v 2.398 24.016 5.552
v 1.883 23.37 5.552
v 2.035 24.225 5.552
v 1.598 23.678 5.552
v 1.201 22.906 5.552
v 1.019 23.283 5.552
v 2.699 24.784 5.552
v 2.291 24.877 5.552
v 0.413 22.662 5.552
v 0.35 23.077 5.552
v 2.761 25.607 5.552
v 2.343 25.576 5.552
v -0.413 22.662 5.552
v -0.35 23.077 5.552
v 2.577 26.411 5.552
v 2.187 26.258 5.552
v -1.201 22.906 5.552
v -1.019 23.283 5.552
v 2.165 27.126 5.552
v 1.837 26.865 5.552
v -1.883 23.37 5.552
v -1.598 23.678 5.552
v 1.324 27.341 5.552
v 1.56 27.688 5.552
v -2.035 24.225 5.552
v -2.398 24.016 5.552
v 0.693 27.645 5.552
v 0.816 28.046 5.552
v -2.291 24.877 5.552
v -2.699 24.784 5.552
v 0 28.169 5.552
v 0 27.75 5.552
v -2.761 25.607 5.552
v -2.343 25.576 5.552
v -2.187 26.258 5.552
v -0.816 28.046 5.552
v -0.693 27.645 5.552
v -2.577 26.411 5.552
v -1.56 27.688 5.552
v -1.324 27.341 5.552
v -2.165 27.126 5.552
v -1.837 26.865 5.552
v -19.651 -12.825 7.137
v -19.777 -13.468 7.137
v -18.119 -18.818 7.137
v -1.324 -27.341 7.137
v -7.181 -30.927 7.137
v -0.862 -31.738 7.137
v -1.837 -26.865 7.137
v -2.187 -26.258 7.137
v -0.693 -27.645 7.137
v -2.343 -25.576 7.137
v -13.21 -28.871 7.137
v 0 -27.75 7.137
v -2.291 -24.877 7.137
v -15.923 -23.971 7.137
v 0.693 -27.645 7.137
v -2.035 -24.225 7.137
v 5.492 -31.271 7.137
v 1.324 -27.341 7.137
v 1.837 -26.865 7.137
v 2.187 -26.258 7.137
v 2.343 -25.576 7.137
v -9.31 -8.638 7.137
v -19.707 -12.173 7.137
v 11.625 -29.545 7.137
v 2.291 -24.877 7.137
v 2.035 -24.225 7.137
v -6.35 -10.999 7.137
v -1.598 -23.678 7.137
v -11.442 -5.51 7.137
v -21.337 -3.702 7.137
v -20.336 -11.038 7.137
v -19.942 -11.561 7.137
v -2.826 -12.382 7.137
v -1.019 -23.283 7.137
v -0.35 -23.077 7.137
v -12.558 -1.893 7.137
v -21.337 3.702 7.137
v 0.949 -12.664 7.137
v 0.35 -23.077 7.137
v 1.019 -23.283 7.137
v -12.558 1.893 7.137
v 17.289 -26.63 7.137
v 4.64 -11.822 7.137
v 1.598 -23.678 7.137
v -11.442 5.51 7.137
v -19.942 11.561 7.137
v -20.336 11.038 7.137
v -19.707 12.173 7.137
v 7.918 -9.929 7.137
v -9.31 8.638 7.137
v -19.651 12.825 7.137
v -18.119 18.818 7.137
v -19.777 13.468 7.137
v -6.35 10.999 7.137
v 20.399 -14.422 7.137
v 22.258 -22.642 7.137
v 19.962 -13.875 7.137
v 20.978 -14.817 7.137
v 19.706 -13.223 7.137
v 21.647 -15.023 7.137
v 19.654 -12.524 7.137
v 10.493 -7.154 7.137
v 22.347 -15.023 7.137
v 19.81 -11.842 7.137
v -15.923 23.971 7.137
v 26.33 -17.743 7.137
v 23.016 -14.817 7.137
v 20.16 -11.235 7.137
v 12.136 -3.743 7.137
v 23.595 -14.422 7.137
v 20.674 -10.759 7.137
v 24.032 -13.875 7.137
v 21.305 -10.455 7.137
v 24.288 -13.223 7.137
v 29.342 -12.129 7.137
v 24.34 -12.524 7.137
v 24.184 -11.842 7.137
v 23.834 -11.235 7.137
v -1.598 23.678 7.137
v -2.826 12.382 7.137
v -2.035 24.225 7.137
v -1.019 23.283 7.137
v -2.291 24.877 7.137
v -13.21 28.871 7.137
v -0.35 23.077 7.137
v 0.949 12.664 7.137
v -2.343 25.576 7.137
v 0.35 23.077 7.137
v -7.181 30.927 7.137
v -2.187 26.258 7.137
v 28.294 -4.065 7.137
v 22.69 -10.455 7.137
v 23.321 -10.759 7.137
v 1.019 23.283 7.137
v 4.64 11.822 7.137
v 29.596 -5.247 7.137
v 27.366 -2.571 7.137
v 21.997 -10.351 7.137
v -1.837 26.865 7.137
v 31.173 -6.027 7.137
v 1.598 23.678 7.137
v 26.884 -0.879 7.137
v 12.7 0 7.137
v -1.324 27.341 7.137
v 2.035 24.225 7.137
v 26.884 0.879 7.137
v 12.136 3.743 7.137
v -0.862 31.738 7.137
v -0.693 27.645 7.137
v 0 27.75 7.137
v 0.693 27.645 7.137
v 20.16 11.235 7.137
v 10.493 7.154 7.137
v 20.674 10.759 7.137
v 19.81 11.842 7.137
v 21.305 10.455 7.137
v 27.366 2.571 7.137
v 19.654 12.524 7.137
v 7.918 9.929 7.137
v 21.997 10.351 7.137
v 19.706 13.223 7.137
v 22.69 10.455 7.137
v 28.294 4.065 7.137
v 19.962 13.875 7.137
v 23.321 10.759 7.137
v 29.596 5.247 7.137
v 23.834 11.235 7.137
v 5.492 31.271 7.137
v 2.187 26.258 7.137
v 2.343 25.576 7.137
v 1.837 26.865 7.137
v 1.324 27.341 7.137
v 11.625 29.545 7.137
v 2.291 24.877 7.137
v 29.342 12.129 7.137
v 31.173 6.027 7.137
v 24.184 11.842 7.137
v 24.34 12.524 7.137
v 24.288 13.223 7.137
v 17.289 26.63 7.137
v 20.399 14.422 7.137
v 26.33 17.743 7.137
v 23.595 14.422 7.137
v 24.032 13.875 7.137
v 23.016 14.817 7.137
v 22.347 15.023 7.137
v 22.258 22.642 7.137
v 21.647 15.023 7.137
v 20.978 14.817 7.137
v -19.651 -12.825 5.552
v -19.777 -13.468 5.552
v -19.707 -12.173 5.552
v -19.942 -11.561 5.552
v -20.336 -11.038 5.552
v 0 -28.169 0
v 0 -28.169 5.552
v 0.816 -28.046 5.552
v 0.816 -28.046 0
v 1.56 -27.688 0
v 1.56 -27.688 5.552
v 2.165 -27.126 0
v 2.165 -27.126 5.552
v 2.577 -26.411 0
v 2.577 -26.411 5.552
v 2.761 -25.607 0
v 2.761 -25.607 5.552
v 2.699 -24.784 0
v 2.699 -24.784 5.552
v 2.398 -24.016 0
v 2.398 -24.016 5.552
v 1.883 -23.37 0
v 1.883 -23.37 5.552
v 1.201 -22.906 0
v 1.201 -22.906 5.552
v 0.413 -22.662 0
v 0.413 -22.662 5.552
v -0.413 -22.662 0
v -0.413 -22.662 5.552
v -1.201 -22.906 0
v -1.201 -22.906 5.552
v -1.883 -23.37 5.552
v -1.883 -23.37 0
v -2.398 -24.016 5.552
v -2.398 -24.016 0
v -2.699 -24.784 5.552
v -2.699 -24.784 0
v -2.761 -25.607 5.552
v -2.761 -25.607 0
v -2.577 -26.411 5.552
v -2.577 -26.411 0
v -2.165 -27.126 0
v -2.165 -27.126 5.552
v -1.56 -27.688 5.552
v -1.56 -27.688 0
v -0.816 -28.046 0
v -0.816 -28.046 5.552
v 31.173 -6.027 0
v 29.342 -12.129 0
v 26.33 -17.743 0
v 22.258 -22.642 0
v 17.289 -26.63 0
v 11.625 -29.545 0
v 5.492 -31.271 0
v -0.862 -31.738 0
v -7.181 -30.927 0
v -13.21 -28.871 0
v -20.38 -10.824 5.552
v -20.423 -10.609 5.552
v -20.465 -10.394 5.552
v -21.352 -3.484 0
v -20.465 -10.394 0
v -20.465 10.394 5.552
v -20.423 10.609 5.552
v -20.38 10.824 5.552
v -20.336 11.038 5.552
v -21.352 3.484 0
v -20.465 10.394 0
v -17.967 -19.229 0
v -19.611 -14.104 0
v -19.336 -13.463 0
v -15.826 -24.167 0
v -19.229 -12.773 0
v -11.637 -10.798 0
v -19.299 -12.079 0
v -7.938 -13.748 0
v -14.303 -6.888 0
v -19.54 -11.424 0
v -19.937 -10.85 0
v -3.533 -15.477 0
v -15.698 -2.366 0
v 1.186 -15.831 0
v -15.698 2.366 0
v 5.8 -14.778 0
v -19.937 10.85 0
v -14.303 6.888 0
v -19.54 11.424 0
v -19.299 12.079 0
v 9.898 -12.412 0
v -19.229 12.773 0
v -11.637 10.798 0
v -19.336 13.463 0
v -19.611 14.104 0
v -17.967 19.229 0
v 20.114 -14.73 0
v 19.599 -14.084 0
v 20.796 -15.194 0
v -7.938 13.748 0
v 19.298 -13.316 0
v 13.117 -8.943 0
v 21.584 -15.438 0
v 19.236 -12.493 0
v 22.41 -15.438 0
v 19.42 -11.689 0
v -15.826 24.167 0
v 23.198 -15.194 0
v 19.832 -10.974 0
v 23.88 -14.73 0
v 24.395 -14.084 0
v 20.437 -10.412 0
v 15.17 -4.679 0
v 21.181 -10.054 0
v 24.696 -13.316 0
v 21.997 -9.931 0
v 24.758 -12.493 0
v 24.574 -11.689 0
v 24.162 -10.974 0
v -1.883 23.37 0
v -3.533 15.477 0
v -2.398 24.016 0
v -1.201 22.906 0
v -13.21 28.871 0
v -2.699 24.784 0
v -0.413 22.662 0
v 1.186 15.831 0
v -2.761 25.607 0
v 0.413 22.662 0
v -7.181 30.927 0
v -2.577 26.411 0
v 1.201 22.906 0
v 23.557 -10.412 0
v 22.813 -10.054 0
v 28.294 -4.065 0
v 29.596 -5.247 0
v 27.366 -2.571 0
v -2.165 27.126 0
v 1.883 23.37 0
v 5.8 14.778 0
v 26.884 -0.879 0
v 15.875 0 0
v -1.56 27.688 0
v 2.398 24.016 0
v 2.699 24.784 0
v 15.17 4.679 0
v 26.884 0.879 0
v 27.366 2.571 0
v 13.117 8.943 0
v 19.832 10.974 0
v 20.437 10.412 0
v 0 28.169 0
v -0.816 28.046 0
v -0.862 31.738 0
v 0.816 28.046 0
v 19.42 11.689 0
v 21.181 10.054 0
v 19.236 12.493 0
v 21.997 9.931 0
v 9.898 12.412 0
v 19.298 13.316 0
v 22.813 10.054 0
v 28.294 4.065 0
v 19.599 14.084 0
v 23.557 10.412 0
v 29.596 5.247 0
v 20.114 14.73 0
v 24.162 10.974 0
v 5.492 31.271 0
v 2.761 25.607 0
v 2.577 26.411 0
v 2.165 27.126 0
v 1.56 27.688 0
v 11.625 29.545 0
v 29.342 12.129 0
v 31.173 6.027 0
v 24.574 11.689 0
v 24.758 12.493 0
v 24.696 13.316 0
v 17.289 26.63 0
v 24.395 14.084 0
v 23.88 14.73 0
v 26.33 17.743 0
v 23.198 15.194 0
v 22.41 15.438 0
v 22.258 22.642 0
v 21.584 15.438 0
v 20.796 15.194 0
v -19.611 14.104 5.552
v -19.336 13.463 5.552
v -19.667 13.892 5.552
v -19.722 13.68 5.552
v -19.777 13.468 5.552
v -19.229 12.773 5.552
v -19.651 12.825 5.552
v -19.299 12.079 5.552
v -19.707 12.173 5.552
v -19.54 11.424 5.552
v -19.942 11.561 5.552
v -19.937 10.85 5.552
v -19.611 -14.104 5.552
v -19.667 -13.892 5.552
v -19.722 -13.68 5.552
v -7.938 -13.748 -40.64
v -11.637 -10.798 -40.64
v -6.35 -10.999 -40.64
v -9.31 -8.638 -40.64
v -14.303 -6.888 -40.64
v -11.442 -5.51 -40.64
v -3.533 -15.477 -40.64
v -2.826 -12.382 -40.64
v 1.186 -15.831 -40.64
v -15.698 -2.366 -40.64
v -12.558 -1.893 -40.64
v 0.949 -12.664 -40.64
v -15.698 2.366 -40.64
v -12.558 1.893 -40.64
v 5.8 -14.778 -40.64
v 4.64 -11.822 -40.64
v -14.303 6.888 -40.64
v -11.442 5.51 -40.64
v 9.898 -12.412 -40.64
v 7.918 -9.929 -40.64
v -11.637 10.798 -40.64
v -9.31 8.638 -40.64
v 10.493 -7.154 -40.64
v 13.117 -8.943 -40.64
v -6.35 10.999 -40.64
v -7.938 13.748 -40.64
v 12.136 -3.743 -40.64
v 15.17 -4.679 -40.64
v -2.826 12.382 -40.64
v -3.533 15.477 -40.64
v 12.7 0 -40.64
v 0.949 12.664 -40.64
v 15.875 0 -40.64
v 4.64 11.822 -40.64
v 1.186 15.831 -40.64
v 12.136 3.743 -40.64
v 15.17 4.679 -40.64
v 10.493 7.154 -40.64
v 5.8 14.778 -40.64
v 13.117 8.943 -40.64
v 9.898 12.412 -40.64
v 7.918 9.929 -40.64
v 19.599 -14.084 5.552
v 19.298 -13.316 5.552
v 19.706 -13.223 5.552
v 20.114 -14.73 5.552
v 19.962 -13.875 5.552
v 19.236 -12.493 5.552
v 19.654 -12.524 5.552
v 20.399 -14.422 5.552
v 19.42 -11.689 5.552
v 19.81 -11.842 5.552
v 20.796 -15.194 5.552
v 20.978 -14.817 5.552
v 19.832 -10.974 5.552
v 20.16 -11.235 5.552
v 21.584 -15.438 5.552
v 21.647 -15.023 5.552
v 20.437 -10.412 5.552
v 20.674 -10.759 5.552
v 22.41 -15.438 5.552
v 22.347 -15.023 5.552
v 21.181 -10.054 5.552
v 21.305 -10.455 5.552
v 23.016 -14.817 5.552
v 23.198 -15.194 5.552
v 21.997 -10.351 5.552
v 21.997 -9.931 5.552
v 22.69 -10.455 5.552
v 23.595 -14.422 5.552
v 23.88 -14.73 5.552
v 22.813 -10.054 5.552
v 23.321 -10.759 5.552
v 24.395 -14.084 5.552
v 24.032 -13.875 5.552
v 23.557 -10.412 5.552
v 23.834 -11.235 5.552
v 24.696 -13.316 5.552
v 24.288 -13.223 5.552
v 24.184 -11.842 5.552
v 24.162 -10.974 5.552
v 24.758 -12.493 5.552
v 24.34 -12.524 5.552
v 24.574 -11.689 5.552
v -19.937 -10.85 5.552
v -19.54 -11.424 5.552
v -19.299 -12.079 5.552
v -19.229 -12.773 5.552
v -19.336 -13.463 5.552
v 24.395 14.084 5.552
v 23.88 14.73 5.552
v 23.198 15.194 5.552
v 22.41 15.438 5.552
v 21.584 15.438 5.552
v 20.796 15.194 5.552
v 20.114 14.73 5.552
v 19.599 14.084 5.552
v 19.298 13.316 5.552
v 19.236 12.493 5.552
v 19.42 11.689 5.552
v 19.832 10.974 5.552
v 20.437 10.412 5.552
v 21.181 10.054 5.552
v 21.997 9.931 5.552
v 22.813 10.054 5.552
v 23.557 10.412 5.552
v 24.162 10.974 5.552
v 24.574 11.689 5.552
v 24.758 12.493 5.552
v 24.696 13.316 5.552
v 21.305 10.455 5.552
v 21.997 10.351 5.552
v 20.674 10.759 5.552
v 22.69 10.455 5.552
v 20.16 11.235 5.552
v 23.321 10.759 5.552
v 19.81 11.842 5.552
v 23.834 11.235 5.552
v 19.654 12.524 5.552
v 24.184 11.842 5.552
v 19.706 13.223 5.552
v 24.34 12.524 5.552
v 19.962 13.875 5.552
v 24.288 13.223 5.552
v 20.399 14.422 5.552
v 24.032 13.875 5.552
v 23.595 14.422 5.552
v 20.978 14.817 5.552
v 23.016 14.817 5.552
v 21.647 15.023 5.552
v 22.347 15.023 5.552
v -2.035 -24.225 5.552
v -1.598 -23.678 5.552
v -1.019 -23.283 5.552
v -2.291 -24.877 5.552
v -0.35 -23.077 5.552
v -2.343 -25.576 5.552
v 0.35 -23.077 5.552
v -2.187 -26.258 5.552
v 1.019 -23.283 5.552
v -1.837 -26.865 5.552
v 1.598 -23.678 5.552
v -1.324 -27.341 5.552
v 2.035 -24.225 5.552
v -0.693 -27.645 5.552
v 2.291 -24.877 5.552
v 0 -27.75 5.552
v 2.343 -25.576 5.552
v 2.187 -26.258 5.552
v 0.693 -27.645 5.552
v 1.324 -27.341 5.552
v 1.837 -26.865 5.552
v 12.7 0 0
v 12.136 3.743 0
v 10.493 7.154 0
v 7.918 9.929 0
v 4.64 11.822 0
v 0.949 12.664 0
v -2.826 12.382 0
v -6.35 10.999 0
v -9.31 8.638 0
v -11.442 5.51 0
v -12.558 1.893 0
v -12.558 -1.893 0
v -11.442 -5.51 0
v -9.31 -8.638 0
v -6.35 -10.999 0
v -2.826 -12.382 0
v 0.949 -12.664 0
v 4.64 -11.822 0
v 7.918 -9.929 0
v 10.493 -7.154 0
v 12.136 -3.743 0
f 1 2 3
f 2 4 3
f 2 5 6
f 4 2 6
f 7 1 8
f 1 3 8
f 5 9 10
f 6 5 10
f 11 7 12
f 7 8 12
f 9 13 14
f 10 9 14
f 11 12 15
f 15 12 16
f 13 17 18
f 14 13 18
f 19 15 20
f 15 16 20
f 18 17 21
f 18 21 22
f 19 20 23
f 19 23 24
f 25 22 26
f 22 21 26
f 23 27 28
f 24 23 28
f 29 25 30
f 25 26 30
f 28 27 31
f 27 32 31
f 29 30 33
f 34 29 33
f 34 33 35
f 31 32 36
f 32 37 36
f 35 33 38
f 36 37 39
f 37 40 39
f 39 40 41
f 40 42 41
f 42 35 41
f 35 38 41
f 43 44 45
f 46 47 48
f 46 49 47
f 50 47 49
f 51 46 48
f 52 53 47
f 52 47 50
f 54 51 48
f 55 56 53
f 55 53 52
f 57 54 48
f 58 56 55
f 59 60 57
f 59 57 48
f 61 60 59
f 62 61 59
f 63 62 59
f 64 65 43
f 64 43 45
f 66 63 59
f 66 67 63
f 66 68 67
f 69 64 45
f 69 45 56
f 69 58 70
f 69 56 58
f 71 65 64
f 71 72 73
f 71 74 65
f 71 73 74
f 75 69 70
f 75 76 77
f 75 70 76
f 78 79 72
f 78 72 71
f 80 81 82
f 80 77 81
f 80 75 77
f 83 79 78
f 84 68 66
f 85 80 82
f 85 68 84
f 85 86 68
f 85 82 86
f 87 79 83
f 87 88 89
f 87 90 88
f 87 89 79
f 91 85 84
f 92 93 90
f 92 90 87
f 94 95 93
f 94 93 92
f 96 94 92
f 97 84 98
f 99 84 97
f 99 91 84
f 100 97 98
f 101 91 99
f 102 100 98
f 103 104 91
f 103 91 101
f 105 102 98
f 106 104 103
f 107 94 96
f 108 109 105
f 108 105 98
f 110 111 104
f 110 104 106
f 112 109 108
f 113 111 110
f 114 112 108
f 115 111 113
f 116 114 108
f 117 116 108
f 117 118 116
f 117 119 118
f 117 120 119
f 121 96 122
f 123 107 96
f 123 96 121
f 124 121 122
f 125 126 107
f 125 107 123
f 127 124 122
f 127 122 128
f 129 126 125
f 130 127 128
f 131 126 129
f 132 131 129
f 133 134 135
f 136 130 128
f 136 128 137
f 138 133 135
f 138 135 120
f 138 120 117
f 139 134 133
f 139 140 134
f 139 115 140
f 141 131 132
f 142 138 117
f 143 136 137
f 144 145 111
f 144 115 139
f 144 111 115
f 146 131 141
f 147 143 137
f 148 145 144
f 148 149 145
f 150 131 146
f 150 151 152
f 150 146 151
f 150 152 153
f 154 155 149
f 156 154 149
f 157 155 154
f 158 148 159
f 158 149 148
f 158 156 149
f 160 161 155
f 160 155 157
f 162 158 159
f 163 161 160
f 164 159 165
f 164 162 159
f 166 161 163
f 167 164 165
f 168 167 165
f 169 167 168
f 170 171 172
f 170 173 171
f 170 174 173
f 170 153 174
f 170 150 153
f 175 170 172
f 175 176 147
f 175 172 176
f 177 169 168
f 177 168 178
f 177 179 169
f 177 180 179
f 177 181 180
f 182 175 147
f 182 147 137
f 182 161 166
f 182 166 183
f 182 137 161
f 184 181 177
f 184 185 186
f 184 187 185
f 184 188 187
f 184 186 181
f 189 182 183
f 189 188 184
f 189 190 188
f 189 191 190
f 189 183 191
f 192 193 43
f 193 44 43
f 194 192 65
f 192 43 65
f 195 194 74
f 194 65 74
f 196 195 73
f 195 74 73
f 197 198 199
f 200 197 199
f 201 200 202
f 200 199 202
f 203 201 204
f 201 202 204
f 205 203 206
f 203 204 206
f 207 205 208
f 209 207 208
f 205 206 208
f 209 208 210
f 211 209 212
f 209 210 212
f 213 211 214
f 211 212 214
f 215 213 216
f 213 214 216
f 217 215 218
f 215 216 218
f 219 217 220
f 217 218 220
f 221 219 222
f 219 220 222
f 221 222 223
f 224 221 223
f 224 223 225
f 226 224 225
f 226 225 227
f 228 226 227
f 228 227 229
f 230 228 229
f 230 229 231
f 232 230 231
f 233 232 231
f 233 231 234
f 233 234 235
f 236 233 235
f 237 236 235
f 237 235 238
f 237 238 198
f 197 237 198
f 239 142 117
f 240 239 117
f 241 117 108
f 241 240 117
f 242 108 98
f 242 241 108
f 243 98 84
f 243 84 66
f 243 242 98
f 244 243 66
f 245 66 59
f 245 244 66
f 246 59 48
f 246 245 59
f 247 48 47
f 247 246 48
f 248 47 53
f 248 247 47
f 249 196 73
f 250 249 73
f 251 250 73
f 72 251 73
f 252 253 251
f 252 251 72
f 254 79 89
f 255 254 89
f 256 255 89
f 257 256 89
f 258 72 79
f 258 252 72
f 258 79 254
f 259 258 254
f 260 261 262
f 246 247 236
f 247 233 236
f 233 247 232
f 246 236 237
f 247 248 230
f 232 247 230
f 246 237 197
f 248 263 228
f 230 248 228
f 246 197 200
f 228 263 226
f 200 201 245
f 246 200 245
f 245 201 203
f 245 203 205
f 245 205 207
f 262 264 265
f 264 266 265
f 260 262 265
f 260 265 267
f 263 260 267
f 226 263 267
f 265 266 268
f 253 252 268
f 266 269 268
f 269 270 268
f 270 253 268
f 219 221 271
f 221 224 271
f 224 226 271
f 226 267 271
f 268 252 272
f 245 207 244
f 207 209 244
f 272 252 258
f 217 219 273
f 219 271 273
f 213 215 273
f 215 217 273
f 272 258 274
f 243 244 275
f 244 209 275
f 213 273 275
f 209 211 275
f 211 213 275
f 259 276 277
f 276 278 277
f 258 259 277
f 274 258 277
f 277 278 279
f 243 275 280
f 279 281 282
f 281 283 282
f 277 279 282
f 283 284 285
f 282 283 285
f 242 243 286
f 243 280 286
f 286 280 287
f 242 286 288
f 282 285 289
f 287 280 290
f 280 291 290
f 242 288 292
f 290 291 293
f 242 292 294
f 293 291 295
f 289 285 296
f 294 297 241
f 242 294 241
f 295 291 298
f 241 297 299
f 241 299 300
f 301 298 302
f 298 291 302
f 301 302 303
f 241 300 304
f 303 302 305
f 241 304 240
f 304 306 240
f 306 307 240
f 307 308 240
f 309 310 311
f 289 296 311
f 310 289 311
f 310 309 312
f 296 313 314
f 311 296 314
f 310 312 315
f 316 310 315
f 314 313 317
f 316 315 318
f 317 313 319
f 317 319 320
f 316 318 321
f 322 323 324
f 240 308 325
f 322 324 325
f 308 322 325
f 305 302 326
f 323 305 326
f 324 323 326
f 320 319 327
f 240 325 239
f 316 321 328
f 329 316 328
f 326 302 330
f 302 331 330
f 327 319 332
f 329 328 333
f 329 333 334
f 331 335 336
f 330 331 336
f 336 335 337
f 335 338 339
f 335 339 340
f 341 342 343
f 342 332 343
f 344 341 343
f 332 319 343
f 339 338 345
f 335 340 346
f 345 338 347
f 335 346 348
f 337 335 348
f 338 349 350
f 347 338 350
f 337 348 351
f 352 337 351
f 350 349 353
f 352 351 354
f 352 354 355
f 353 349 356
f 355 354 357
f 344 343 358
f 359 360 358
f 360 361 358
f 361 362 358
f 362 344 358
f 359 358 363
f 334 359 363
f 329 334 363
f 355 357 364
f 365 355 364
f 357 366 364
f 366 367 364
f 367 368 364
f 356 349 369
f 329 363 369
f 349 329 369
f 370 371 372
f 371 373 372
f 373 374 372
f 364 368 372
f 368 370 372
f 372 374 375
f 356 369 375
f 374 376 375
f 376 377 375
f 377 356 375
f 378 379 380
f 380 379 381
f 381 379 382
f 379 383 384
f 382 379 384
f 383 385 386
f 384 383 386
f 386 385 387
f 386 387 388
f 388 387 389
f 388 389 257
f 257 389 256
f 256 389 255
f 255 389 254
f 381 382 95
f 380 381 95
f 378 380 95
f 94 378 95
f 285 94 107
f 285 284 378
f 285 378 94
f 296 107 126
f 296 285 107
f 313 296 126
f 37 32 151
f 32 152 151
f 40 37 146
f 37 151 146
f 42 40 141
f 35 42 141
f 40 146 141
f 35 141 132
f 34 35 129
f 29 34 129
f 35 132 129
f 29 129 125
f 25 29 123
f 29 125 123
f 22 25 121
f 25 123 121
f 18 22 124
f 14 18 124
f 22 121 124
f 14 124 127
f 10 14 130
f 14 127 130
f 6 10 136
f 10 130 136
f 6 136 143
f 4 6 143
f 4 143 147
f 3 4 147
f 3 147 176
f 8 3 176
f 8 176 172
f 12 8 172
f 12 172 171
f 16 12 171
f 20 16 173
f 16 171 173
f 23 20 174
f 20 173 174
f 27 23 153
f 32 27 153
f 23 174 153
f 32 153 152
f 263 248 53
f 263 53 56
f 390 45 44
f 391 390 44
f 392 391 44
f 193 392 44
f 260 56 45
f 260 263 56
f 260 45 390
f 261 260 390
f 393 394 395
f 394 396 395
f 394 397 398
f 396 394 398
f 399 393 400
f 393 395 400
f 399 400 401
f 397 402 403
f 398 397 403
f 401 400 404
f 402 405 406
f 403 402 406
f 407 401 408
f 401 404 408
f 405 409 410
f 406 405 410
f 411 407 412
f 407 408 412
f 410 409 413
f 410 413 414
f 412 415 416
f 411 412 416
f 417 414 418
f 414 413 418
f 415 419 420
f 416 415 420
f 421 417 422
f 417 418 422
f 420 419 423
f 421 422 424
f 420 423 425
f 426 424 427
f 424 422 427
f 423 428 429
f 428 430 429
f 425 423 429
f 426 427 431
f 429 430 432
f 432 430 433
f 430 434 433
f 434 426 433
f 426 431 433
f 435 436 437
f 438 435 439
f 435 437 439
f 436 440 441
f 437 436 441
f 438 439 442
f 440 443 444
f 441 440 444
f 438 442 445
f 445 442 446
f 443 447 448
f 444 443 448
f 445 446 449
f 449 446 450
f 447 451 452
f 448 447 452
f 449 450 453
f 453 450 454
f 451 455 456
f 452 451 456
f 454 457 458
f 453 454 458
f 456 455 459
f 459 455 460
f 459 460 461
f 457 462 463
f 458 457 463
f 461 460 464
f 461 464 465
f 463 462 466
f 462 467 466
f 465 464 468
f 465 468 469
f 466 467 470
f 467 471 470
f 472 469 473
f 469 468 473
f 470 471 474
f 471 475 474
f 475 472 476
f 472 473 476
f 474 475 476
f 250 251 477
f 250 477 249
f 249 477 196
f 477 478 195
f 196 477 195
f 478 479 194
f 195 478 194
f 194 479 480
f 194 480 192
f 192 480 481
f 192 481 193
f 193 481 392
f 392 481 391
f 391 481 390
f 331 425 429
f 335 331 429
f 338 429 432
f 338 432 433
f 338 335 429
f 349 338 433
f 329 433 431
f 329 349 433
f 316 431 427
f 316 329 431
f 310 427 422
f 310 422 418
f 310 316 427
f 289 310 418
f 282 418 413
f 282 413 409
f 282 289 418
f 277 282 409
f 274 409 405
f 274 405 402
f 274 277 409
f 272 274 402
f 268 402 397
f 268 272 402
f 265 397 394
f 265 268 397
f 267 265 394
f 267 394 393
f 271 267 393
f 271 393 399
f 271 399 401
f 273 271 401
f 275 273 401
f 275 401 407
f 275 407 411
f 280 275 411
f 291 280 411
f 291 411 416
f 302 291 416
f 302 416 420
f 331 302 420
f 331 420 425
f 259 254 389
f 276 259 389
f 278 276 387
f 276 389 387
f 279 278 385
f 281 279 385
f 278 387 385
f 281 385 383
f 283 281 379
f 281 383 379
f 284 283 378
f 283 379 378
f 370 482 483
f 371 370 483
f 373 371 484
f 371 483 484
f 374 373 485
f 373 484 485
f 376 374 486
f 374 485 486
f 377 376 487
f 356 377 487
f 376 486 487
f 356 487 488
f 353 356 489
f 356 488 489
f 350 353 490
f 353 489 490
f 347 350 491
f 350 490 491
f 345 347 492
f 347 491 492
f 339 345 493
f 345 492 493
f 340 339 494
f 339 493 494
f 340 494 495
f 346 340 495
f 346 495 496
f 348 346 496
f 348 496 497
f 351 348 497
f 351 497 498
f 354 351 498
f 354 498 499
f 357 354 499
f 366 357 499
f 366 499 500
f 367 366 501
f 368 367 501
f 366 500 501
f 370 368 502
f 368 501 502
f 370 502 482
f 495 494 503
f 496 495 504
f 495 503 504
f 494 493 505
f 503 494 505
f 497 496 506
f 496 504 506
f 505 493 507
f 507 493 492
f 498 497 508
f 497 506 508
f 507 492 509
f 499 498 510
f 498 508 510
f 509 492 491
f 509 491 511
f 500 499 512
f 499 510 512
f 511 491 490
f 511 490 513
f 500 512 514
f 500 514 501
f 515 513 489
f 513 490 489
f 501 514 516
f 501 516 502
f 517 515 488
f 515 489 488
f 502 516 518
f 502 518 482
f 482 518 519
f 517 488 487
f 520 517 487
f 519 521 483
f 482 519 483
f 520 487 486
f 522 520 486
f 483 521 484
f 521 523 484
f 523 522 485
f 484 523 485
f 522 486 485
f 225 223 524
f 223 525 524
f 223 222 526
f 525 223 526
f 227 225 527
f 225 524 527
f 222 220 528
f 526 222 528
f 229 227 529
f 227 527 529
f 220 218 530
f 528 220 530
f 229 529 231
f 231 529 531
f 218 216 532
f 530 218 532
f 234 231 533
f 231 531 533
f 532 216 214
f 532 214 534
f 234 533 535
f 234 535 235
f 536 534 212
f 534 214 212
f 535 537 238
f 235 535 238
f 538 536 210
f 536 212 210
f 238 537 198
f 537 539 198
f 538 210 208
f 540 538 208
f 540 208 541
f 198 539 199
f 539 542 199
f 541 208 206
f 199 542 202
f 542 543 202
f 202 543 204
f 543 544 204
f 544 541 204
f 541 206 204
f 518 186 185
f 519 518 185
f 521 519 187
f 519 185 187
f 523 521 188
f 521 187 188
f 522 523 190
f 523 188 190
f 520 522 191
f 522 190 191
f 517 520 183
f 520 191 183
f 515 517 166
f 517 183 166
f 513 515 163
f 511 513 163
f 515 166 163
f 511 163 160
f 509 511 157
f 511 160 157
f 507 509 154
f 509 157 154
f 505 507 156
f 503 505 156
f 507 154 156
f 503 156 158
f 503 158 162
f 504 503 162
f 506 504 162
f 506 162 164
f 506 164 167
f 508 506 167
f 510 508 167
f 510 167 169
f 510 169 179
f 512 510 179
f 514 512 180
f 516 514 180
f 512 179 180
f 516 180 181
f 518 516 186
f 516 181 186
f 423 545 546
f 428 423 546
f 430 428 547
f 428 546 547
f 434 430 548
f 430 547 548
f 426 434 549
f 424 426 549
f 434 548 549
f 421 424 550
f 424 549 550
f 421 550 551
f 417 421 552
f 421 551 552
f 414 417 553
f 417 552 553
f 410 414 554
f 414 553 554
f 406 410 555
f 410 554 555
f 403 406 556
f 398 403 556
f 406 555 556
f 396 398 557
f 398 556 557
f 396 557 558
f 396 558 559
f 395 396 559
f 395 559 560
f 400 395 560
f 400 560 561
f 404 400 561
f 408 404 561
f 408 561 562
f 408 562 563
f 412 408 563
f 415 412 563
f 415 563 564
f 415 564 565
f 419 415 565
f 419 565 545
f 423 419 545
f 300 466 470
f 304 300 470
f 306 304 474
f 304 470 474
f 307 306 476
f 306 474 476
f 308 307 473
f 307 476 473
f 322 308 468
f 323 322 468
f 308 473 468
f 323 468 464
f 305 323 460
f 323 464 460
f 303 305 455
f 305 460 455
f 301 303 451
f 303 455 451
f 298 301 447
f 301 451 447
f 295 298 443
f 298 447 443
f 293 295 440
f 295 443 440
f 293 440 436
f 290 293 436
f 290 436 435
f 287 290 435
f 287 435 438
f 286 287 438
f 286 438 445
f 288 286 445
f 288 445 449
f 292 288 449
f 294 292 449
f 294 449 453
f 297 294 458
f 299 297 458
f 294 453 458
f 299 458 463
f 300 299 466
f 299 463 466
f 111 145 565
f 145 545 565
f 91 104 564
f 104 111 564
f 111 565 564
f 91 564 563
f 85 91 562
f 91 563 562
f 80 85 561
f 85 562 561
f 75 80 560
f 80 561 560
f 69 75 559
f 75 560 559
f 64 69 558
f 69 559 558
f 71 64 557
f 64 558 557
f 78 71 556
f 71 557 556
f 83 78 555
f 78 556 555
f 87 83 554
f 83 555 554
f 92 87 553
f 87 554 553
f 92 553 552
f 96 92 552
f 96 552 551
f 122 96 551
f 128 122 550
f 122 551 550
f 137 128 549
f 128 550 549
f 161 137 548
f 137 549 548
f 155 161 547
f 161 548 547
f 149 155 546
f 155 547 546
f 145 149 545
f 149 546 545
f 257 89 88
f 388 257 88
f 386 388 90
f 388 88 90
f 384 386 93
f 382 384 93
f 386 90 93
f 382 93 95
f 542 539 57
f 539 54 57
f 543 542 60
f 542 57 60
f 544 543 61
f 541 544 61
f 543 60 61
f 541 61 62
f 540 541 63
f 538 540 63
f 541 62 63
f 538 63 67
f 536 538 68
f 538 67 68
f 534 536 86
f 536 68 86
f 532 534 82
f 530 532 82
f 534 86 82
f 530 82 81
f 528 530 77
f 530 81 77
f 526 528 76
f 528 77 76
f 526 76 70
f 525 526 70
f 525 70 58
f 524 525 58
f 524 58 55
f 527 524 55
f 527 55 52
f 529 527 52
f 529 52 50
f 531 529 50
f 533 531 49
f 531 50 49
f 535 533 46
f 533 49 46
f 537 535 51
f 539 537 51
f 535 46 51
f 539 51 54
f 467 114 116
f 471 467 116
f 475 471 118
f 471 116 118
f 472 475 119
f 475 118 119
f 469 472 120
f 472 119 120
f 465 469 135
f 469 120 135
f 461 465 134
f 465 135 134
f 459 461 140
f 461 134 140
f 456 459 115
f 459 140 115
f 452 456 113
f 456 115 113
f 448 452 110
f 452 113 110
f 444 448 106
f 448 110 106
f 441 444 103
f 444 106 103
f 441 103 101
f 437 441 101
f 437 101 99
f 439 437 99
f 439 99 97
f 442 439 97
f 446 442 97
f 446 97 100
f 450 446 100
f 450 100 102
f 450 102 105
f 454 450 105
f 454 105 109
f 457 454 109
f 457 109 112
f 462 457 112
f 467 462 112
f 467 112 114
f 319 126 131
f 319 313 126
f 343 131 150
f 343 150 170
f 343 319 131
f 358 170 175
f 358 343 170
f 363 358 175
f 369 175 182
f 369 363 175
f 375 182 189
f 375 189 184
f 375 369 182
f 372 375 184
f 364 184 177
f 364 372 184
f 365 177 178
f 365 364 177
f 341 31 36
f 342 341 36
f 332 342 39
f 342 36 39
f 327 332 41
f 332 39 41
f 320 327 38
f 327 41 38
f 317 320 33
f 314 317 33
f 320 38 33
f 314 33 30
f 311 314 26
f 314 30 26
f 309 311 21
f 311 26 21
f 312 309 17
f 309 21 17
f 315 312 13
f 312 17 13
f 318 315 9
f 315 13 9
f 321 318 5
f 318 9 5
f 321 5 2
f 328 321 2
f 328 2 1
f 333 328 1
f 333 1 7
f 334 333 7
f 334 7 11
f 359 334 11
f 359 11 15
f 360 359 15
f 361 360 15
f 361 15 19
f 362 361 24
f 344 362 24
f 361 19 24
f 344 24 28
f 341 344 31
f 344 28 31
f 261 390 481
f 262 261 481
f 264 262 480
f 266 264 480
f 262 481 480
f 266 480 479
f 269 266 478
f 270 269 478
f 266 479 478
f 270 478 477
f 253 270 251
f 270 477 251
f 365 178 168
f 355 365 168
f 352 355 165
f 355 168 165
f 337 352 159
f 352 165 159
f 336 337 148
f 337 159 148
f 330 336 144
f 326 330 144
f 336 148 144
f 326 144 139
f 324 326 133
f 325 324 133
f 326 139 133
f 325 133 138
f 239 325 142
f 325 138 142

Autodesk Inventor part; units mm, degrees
ref_plane "YZ Plane" through (0, 0, 0) normal (1, 0, 0) x (0, 1, 0)
ref_plane "XZ Plane" through (0, 0, 0) normal (0, 1, 0) x (-1, 0, 0)
ref_plane "XY Plane" through (0, 0, 0) normal (0, 0, 1) x (1, 0, 0)
sketch "Sketch1" plane through (0, 0, 0) normal (0, 0, 1) x (1, 0, 0)
  circle A0 centre (0, 0) radius 15.875
  circle A1 centre (0, 0) radius 12.7
  dimension "d0" = 31.75
  dimension "d1" = 25.4
extrude "Eyepiece Extrusion" add sketch "Sketch1" against normal blind 40.64
sketch "Sketch2" plane through (0, 0, 0) normal (0, 0, 1) x (1, 0, 0)
  circle A0 centre (0, 0) radius 12.7
  circle A1 centre (0, 0) radius 31.75
  dimension "d6" = 25.4
  dimension "d7" = 63.5
extrude "Bolt Extrusion" add sketch "Sketch2" along normal blind 7.1374
sketch "Sketch3" plane through (0, 0, 0) normal (0, 0, -1) x (-1, 0, 0)
  circle A0 centre (0, 0) radius 31.75 projected
  circle A1 centre (-33.1656, 0) radius 54.6286 projected
  circle A2 centre (0, 0) radius 12.7 projected
  circle A3 centre (0, 0) radius 15.875 projected
  arc A4 (18.442, -17.4658) -> (18.442, 17.4658) centre (-33.1656, 0) ccw
  circle A5 centre (0, 0) radius 25.4 construction
  point P0 (13.2104, 28.8712)
  point P1 (13.2104, -28.8712)
  dimension "d8" = 108.966
extrude "Cutout For Filter Wheel" cut sketch "Sketch3" against normal through all contours A0 A1 picked at (24.3045, -5.7561)
sketch "Sketch8" plane through (0, 0, 7.1374) normal (0, 0, 1) x (1, 0, 0)
  circle A0 centre (33.1724, 0) radius 6.35
  point P0 (0, 0)
  dimension "d50" = 12.7
  dimension "d51" = 33.1724
extrude "Extrusion4" cut sketch "Sketch8" against normal through all
sketch "Sketch9" plane through (0, 0, 0) normal (0, 0, -1) x (-1, 0, 0)
  point P0 (0, 0)
  point P1 (0, 25.4)
  dimension "d59" = 25.4
hole "Hole4" at (0, 25.4, 0) direction (0, 0, 1) diameter 4.699 depth 7.1374 counterbore diameter 5.5372 counterbore depth 5.5524
pattern_circular "Circular Pattern2" count 6 over 360 about axis through (0, 0, -10) along (0, 0, 1) of "Hole4"
equation "\"d0\" = outsideDiameter"
equation "\"d1\" = insideDiameter"
equation "\"d2\" = extrusionNoseDepth"
equation "\"d6\" = insideDiameter"
equation "\"d7\" = maxOutsideDiameter"
equation "\"d4\" = support"
equation "\"d59\" = radiusForHoles"
equation "\"outsideDiameter\" = 31.75"
equation "\"insideDiameter\" = 25.4"
equation "\"support\" = 7.1374"
equation "\"totalHeight\" = 44.45"
equation "\"maxOutsideDiameter\" = 63.5"
equation "\"eyepieceNoseDepth\" = 38.1"
equation "\"baseDepth\" = 2.54"
equation "\"extrusionNoseDepth\" = eyepieceNoseDepth + baseDepth"
equation "\"radiusForHoles\" = 25.4"
properties part number "insertToScope" material "PET Plastic"
